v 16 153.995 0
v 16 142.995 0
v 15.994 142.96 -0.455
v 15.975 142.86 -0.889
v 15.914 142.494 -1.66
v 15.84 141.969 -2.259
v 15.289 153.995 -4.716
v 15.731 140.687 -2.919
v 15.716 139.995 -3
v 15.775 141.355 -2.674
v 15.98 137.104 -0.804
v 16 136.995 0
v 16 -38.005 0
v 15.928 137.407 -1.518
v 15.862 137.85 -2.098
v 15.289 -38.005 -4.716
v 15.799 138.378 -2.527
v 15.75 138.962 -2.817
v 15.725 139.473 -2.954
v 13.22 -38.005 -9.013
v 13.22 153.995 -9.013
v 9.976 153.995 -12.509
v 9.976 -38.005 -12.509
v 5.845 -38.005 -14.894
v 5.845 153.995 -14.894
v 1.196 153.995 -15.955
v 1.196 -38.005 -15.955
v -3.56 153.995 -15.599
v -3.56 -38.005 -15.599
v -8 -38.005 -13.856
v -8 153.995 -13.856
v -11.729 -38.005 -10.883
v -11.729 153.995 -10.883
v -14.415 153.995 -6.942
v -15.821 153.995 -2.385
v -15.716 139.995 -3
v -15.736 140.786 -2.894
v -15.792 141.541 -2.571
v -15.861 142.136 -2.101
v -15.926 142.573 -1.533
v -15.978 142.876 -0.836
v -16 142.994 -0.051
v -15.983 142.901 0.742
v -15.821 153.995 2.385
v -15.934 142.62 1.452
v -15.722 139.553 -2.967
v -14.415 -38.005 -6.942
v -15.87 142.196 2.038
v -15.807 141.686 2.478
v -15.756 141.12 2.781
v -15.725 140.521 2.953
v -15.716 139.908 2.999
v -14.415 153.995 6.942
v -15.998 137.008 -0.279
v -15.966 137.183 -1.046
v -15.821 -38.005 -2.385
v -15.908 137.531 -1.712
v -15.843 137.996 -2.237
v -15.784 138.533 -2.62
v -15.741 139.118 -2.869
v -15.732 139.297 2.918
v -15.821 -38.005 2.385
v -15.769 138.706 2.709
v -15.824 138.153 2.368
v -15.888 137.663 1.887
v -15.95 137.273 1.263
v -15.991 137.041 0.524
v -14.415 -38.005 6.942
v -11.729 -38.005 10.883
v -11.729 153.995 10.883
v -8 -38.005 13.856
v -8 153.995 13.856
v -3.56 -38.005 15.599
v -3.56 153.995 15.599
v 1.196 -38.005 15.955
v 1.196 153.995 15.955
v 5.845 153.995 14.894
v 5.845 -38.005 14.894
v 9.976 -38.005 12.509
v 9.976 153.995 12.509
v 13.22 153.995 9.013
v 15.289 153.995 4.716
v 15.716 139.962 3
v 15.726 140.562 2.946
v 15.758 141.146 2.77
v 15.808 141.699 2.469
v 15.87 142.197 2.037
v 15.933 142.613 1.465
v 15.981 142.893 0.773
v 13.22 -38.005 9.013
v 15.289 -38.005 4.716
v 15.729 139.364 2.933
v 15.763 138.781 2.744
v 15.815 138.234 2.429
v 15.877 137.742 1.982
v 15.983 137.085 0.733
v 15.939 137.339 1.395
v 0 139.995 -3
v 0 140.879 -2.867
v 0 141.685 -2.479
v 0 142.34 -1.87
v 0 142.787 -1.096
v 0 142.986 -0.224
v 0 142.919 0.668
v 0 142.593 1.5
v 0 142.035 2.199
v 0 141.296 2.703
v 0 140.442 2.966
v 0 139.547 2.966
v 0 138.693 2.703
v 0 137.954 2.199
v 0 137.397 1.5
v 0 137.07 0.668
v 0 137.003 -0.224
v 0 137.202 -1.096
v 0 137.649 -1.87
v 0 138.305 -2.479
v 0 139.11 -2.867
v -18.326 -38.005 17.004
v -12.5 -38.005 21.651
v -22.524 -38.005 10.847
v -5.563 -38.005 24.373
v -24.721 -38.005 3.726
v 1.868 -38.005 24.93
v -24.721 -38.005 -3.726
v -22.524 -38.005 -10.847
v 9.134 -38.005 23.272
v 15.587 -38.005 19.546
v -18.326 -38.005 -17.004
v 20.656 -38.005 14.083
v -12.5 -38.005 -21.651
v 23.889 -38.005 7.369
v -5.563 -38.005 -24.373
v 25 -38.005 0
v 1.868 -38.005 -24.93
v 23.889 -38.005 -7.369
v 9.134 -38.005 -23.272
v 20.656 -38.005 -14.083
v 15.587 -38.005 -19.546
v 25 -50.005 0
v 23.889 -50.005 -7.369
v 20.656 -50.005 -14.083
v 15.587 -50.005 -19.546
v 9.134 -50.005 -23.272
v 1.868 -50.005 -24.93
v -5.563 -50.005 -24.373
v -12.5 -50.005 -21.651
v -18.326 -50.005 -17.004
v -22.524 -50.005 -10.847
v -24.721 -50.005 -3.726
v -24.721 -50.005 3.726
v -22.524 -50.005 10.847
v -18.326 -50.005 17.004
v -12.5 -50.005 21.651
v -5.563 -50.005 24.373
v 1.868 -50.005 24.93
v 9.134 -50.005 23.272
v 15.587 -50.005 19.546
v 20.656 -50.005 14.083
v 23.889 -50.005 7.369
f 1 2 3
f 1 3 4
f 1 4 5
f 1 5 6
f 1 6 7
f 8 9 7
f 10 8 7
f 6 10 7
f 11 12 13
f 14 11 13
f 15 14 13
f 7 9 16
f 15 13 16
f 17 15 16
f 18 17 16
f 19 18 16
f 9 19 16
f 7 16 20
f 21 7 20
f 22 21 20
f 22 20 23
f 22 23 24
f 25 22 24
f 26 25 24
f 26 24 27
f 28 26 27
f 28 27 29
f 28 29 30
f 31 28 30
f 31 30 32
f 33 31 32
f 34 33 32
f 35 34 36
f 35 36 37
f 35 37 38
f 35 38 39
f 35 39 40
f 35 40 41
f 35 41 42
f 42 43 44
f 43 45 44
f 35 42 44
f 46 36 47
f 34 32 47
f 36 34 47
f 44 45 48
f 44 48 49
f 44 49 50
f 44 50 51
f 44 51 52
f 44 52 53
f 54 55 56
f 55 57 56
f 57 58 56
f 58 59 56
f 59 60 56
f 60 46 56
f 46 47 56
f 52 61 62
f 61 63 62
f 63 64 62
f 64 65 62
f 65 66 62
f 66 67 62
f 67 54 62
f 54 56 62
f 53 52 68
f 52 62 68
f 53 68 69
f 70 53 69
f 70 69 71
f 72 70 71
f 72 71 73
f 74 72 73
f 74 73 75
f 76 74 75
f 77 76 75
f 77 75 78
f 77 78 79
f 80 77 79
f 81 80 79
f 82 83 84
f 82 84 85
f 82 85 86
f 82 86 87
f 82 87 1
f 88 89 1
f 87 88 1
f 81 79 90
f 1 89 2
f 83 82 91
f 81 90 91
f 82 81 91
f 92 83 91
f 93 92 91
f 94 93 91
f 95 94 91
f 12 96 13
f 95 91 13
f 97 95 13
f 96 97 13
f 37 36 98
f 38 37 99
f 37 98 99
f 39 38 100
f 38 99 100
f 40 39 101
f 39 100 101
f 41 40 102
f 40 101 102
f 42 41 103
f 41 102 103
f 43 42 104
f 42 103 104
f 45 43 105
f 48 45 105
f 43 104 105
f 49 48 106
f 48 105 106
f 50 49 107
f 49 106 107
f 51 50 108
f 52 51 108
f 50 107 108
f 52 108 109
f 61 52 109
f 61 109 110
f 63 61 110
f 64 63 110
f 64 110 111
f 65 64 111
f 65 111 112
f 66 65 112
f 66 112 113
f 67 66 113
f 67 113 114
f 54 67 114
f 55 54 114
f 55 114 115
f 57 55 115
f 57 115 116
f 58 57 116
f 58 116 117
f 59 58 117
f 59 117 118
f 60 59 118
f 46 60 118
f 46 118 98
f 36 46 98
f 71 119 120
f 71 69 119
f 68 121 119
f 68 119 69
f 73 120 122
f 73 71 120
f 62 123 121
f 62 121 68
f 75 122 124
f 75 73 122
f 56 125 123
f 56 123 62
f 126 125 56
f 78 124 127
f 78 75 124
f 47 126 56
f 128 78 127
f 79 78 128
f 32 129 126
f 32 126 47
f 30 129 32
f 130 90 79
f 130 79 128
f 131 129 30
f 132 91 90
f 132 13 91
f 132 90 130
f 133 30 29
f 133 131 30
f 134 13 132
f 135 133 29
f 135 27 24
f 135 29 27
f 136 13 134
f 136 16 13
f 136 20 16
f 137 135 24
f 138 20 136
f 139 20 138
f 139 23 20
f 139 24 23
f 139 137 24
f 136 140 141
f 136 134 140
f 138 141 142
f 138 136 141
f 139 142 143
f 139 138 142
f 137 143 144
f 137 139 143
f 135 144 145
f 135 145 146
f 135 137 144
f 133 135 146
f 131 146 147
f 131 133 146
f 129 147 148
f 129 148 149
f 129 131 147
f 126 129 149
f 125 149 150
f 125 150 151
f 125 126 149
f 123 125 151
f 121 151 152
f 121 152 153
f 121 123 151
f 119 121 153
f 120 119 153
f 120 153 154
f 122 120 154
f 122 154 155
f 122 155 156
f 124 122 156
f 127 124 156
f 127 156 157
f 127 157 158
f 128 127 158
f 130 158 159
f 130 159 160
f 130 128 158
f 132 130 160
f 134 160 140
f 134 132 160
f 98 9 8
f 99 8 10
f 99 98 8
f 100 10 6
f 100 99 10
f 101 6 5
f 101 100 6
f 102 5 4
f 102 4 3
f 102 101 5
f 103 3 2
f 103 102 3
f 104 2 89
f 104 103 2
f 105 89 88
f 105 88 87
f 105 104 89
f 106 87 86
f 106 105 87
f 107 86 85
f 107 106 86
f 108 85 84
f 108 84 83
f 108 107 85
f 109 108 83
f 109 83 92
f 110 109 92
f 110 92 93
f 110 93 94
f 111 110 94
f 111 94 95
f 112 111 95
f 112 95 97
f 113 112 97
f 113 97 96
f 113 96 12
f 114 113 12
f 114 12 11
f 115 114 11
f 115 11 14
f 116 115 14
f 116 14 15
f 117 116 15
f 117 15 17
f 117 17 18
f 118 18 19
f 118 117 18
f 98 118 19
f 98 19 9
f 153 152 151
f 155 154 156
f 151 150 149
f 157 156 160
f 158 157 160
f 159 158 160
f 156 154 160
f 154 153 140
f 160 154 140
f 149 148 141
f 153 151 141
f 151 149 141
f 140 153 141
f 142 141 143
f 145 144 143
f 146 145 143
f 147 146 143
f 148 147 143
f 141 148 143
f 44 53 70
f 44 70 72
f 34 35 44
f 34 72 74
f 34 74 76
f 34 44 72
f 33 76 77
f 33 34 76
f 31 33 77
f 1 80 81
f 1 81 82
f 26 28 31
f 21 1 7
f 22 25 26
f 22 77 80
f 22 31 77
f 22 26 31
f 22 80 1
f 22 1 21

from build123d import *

# Parameters (mm, degrees)
SKETCH1_R               = 12.5
BOSS_EXTRUDE1_DEPTH     = 3
SKETCH2_R               = 8
BOSS_EXTRUDE2_DEPTH     = 96
SKETCH5_R               = 1.5
CUT_EXTRUDE1_DEPTH      = 13.5
CUT_EXTRUDE1_DEPTH_BACK = 13.5
SCALE1_SCALE            = 2


with BuildPart() as part:
    # Sketch1 → Boss-Extrude1 (new body, symmetric)
    with BuildSketch(Plane(origin=(0, 0, 0), x_dir=(1, 0, 0), z_dir=(0, 1, 0))):
        Circle(SKETCH1_R)
    extrude(amount=BOSS_EXTRUDE1_DEPTH, both=True)

    # Sketch2 → Boss-Extrude2 (add)
    with BuildSketch(Plane(origin=(0, 3, 0), x_dir=(1, 0, 0), z_dir=(0, 1, 0))):
        Circle(SKETCH2_R)
    extrude(amount=BOSS_EXTRUDE2_DEPTH)

    # Sketch5 → Cut-Extrude1 (cut, two sides)
    with BuildSketch(Plane(origin=(0, 0, 0), x_dir=(0, 0, -1), z_dir=(1, 0, 0))) as cut_extrude1_sk:
        with Locations((0, 92)):
            Circle(SKETCH5_R)
    extrude(amount=CUT_EXTRUDE1_DEPTH, mode=Mode.SUBTRACT)
    extrude(cut_extrude1_sk.sketch, amount=-CUT_EXTRUDE1_DEPTH_BACK, mode=Mode.SUBTRACT)


with BuildPart() as part_1:
    # Scale1: scaled about (-2.171e-06, 44.005415619, -5.482e-06)
    add(part.part.scale(SCALE1_SCALE).moved(Location((2.171e-06, -44.005415619, 5.482e-06))))


solid = part_1.part
